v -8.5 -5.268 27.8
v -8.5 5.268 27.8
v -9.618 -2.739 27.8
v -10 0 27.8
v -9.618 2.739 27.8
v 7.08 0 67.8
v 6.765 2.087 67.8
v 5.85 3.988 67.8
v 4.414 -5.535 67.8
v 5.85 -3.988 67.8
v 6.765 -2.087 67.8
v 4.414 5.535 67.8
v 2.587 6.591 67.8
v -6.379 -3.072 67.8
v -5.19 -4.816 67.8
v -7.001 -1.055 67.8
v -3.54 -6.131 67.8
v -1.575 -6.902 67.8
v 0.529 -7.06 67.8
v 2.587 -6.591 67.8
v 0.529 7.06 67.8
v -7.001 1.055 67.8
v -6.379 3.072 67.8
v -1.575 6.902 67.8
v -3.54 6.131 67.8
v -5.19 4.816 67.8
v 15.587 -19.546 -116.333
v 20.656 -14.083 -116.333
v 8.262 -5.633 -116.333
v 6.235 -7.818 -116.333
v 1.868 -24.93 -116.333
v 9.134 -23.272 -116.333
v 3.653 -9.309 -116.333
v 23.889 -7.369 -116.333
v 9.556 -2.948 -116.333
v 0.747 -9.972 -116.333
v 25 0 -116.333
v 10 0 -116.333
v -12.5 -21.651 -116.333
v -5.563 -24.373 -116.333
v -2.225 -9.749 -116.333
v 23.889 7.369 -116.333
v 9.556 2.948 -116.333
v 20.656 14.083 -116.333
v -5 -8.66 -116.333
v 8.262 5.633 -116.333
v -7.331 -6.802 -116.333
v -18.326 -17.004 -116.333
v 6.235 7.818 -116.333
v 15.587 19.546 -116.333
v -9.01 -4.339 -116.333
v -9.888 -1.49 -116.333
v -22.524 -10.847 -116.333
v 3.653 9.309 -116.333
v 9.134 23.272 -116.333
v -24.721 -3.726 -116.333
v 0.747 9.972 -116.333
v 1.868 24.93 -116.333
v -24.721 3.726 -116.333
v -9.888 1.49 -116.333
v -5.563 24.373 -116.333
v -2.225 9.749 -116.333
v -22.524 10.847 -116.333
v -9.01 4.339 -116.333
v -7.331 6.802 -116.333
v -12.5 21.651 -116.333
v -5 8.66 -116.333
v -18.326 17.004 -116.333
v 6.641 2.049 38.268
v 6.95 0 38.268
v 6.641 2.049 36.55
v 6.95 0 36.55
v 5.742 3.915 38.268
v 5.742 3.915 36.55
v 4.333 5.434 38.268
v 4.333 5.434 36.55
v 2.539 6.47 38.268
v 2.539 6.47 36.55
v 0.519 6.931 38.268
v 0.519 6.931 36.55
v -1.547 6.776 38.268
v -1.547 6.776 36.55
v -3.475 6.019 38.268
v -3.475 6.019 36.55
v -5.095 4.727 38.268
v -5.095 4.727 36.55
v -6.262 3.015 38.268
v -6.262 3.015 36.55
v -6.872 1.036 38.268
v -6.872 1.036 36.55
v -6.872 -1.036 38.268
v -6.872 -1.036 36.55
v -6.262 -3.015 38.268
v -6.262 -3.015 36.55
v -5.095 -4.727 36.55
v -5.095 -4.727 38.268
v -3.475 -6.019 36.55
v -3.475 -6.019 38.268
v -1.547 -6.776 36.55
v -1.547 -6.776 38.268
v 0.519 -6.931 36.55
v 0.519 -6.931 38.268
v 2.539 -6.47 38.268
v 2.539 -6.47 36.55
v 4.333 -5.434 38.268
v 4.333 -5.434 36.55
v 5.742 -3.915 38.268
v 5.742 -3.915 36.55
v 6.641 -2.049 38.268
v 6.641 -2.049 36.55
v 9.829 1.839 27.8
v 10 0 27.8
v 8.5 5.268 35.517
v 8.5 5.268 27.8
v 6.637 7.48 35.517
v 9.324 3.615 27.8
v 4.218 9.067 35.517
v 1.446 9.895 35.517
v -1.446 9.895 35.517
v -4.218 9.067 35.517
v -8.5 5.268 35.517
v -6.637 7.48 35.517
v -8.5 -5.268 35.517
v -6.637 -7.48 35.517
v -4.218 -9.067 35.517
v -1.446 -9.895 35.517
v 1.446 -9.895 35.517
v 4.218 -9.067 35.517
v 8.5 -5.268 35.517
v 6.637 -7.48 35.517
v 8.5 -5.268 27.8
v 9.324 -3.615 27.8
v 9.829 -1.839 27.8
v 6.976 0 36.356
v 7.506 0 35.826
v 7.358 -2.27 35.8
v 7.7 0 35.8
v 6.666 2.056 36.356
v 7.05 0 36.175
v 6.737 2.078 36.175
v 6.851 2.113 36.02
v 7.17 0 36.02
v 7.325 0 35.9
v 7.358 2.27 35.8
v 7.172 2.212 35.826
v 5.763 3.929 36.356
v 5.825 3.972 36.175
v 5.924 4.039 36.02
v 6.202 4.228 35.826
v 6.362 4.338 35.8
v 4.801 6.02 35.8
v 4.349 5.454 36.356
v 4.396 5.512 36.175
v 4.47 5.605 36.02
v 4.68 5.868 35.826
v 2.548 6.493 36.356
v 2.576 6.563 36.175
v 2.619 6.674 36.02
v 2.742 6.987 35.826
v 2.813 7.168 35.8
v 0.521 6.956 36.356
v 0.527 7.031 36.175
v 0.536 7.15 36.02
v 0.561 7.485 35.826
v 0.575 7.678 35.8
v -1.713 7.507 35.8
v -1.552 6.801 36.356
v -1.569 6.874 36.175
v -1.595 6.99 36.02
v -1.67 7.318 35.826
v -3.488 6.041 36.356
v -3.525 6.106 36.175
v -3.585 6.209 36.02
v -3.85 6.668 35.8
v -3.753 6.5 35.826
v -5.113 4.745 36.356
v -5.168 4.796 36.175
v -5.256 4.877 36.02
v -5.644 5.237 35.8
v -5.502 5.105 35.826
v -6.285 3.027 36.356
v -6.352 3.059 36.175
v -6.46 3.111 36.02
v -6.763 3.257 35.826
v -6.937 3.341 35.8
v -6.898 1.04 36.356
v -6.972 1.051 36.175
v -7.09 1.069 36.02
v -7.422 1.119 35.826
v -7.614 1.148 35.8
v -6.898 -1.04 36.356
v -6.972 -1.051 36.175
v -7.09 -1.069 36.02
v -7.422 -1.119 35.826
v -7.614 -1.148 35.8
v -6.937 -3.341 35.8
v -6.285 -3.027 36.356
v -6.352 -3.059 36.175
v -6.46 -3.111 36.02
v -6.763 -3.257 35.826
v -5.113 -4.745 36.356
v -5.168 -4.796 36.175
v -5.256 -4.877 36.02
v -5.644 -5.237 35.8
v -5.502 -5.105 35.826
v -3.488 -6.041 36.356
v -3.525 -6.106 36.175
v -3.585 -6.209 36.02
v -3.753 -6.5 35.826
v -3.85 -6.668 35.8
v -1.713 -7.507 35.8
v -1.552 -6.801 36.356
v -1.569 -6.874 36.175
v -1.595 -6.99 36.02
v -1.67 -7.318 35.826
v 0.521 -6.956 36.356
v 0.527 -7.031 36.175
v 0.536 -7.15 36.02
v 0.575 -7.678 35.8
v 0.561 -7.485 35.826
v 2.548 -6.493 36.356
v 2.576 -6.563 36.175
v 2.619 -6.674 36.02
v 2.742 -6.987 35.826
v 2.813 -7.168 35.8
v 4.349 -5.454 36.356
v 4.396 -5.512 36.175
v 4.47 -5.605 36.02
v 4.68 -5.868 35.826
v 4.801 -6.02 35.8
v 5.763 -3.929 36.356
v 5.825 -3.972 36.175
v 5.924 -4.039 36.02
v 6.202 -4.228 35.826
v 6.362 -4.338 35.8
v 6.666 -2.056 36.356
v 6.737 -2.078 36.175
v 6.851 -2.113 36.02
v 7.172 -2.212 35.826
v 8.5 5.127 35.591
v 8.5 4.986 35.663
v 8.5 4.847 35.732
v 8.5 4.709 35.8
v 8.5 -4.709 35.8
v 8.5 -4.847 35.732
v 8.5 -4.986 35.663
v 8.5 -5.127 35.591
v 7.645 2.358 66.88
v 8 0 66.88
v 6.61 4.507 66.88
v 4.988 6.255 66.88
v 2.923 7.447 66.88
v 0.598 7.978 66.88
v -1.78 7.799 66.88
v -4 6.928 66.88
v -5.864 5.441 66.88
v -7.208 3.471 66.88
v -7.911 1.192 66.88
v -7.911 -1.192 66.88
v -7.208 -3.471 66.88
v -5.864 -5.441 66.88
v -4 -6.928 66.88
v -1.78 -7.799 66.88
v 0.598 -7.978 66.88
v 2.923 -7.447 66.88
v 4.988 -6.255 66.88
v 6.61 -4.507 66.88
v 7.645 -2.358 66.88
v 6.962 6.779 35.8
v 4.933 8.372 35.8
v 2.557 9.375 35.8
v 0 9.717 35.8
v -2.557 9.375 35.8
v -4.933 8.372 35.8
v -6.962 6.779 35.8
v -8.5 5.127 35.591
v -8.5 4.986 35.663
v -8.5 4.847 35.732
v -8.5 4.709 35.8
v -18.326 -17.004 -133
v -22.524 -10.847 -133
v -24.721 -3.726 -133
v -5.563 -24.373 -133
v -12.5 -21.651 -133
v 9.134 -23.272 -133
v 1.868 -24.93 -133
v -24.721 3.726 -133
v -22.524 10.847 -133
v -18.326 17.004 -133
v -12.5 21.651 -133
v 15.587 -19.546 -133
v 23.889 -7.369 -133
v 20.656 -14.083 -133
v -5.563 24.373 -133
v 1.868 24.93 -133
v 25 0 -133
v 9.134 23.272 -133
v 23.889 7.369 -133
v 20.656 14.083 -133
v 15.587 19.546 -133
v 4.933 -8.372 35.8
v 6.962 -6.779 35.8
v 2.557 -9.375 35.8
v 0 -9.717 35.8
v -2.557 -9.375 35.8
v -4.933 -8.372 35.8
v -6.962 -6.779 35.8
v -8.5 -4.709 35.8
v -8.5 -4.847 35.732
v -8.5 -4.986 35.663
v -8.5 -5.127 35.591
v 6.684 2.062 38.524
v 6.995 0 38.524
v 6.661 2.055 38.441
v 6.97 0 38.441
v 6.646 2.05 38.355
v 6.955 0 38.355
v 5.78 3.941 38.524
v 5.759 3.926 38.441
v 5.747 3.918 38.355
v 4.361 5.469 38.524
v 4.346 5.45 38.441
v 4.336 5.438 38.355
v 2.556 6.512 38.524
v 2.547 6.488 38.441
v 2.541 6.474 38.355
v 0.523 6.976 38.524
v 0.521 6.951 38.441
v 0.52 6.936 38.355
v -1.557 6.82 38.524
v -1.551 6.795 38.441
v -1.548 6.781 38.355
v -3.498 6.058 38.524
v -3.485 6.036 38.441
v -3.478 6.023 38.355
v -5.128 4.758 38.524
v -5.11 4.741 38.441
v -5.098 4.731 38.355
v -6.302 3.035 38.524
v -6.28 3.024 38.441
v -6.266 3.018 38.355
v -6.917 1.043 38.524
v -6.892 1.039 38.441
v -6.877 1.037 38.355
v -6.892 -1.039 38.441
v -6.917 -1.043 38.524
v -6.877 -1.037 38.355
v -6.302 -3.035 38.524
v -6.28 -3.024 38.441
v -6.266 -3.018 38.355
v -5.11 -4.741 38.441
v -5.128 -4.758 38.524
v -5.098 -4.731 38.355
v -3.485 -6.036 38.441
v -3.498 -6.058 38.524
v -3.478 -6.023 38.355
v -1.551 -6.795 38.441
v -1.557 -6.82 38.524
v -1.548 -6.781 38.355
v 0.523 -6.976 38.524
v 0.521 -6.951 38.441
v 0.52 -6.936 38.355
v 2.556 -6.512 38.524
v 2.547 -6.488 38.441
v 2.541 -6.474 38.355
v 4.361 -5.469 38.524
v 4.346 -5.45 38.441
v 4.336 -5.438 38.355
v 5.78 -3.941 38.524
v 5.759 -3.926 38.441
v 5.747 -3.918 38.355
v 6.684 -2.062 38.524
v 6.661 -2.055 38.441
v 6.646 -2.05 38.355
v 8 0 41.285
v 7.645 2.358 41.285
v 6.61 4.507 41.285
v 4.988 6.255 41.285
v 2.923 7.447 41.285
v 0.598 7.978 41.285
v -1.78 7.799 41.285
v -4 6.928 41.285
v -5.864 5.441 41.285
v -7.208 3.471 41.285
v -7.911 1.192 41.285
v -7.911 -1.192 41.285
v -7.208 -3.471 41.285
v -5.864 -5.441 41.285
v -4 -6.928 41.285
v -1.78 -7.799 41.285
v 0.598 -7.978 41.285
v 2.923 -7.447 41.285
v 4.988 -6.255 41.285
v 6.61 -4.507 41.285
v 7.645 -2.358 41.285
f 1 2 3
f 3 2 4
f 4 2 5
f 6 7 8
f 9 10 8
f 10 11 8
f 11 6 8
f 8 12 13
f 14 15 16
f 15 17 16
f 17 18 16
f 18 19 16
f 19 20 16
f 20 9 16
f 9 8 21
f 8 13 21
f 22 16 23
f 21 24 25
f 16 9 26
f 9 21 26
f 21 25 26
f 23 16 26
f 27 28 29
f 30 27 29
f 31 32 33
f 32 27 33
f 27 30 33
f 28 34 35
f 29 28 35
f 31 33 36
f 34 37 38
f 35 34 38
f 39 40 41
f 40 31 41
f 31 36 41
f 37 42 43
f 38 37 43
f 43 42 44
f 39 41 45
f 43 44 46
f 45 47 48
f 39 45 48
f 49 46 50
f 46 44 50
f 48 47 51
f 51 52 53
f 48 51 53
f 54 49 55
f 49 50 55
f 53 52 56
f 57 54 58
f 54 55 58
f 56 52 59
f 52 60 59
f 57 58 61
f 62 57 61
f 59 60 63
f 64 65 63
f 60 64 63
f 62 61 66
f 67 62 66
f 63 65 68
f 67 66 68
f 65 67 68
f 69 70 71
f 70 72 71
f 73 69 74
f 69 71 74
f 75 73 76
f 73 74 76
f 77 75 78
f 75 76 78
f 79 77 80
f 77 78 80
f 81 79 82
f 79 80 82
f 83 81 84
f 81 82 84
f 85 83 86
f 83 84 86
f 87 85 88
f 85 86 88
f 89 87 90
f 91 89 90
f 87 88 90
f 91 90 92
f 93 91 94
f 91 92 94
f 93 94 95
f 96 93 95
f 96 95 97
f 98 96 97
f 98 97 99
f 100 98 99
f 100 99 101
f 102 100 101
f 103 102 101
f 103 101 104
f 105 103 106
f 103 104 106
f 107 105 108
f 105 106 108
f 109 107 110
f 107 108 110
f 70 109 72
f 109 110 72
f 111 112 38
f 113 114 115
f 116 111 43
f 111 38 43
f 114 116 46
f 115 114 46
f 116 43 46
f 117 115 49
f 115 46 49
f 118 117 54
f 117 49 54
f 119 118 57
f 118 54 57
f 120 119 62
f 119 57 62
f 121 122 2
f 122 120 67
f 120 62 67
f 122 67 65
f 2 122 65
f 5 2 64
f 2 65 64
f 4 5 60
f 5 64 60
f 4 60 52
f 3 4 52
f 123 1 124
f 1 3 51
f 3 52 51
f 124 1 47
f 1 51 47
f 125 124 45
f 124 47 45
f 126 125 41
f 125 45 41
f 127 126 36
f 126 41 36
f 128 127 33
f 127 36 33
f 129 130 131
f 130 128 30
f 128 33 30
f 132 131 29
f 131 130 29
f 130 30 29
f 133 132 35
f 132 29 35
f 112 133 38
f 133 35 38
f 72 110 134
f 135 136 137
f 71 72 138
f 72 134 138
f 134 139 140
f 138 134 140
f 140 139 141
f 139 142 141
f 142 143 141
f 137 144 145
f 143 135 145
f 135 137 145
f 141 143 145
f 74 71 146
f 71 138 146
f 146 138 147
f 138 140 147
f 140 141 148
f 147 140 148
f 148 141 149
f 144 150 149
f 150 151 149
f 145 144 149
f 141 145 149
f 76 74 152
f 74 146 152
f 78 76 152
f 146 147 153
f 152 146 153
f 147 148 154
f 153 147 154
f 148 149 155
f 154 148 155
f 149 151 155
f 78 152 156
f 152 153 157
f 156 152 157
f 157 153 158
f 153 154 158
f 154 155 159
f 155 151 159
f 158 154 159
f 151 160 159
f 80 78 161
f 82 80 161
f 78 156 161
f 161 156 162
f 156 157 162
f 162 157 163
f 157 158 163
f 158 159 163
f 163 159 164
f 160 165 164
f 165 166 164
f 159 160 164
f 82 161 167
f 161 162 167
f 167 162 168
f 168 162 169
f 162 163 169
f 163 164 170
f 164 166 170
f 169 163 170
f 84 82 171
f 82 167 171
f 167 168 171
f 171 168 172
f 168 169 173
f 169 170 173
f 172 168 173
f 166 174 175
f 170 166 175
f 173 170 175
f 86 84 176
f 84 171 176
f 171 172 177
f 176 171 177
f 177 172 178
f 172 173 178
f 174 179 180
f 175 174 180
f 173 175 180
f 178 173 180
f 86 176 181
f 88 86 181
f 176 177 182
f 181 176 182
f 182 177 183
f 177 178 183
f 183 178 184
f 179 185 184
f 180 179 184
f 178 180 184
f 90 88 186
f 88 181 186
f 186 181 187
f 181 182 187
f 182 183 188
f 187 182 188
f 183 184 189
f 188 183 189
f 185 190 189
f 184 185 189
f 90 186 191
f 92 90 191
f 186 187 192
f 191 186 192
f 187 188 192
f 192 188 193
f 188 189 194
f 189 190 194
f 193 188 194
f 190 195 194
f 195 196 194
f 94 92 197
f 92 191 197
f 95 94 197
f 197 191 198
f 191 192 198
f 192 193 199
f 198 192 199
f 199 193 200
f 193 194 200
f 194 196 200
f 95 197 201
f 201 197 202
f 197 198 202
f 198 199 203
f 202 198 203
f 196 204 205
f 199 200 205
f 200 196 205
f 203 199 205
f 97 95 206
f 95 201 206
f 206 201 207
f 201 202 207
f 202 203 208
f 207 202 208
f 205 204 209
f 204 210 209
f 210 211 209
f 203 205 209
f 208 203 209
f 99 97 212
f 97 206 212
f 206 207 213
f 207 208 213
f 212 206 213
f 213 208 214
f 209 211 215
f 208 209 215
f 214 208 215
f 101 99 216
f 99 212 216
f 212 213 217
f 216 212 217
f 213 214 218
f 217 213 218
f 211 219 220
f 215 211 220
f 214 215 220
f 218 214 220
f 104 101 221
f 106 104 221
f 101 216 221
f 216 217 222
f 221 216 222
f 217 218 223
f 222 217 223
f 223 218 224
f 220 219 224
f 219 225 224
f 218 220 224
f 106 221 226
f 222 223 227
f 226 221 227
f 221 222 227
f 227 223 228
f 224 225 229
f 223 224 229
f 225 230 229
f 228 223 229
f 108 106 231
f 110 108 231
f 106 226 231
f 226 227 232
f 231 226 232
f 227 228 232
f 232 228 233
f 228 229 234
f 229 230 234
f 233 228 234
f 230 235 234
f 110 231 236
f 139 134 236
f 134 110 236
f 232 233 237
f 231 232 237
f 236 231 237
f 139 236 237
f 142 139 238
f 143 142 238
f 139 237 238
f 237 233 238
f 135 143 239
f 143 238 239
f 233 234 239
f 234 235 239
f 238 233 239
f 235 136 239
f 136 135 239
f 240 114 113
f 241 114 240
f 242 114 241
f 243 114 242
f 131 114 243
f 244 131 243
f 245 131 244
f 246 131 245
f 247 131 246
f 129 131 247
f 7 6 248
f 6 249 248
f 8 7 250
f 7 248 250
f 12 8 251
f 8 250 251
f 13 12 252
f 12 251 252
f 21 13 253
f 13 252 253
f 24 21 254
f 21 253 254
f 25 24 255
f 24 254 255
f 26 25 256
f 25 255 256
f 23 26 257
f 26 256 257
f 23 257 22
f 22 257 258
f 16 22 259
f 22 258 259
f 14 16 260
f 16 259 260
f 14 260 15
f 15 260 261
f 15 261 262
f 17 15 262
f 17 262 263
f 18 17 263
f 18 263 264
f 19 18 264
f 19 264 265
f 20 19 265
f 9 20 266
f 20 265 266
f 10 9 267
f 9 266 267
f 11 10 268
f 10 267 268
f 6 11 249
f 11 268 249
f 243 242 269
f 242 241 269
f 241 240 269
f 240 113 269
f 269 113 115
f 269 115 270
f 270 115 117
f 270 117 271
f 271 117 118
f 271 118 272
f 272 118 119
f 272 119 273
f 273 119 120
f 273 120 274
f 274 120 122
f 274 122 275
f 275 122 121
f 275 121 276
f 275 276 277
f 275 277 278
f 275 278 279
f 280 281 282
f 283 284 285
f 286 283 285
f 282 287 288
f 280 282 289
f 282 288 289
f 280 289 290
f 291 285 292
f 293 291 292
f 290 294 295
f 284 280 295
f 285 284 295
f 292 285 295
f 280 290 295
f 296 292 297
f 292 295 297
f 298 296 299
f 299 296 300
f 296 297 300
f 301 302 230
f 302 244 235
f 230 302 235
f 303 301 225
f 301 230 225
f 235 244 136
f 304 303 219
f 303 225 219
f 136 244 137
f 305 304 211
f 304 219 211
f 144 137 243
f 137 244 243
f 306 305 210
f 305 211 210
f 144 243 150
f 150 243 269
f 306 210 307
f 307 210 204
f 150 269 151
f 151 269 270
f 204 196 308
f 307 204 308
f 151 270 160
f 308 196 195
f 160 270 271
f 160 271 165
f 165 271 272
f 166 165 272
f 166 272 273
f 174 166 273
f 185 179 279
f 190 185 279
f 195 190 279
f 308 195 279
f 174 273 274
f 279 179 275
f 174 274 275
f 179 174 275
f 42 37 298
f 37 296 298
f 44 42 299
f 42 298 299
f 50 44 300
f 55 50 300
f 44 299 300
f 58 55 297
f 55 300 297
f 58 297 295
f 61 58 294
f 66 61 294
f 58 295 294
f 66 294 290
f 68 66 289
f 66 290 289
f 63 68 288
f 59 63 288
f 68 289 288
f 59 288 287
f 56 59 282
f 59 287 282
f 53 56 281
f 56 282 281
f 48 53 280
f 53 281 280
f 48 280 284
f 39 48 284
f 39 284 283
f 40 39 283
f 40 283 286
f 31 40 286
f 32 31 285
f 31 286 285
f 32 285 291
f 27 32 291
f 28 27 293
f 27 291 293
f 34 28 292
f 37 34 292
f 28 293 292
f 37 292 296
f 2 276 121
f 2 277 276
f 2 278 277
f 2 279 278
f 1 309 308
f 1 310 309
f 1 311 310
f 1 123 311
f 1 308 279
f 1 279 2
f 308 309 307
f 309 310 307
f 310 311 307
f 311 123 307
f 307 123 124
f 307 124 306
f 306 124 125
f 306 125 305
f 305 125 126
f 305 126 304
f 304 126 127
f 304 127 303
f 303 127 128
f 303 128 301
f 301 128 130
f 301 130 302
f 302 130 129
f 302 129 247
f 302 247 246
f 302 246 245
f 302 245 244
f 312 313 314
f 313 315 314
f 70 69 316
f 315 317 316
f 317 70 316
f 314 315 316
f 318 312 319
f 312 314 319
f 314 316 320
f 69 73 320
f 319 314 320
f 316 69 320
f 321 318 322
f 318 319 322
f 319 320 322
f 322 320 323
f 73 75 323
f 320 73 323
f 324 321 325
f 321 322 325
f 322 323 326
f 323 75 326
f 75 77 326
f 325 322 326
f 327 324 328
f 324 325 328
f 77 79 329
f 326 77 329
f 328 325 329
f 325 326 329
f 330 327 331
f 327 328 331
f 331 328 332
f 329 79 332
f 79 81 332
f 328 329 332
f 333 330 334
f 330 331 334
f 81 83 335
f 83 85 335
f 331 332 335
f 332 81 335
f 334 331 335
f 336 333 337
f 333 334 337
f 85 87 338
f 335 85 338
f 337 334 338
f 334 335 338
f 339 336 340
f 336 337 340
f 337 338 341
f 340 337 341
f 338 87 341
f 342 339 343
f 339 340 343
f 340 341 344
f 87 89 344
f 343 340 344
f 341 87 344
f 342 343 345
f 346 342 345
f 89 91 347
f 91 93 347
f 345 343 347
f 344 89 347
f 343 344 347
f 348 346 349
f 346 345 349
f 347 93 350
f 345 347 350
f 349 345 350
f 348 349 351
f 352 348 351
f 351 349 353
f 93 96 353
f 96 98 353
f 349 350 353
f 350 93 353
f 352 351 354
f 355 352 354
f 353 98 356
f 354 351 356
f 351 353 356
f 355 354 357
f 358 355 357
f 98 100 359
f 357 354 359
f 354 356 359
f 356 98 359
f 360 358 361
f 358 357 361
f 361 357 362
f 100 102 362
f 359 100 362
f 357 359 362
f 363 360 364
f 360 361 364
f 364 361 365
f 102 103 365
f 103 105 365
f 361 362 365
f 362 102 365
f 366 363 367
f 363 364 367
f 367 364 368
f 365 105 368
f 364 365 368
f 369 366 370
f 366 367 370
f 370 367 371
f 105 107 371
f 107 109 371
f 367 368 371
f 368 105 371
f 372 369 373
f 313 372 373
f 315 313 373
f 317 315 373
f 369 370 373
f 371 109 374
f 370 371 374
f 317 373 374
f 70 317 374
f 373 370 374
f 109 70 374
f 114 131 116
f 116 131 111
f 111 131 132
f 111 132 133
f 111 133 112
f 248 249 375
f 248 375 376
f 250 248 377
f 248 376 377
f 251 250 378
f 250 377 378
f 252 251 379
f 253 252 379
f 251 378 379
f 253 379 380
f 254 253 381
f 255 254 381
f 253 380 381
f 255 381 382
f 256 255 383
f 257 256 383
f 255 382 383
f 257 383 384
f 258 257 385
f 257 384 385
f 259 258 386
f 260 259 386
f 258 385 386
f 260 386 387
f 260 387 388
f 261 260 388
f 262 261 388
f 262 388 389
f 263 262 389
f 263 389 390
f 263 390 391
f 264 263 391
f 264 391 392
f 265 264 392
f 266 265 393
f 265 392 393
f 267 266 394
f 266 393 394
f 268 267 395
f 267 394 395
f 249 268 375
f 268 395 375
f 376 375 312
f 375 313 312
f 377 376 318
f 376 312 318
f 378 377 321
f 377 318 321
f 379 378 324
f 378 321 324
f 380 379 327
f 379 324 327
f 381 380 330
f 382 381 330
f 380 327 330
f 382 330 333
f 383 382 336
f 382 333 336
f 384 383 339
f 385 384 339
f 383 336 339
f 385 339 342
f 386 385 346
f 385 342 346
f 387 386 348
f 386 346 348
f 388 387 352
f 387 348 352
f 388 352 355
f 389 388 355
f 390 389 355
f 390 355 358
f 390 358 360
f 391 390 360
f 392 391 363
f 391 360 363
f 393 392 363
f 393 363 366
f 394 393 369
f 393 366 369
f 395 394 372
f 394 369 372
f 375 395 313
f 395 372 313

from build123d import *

# Parameters (mm, degrees)
CUT_EXTRUDE1_DEPTH      = 17
CUT_EXTRUDE1_DEPTH_BACK = 17


with BuildPart() as part:
    # Sketch1 → Revolve1 (revolve)
    with BuildSketch(Plane(origin=(0, 0, 0), x_dir=(0, 0, -1), z_dir=(1, 0, 0))):
        Polygon((-35.8, 0), (-35.8, 9.717157288), (-35.517157288, 10), (116.333333333, 10), (116.333333333, 25), (133, 25), (133, 0), align=None)
    revolve(axis=Axis((0, 0, -133), (0, 0, 1)))

    # Sketch2 → Cut-Extrude1 (cut, two sides: drawn at the far end of the back side and taken through both)
    with BuildSketch(Plane(origin=(0, 0, 0), x_dir=(1, 0, 0), z_dir=(0, 1, 0)).offset(-CUT_EXTRUDE1_DEPTH_BACK)):
        Polygon((-17, -61.8), (17, -61.8), (17, -27.8), (8.5, -27.8), (8.5, -43.8), (-8.5, -43.8), (-8.5, -27.8), (-17, -27.8), align=None)
    extrude(amount=CUT_EXTRUDE1_DEPTH + CUT_EXTRUDE1_DEPTH_BACK, mode=Mode.SUBTRACT)

    # Sketch3 → Revolve2 (revolve)
    with BuildSketch(Plane(origin=(0, 0, 0), x_dir=(0, 0, -1), z_dir=(1, 0, 0))):
        with BuildLine():
            Line((-67.8, 0), (-67.8, 7.08))
            Line((-67.8, 7.08), (-66.88, 8))
            Line((-66.88, 8), (-41.28485129, 8))
            Line((-41.28485129, 8), (-38.524269872, 6.995230534))
            ThreePointArc((-38.524269872, 6.995230534), (-38.397990898, 6.961394185), (-38.267754764, 6.95))
            Line((-38.267754764, 6.95), (-36.55, 6.95))
            ThreePointArc((-36.55, 6.95), (-36.019669914, 7.169669914), (-35.8, 7.7))
            Line((-35.8, 7.7), (-35.05, 7.7))
            Line((-35.05, 7.7), (-35.05, 0))
            Line((-35.05, 0), (-67.8, 0))
        make_face()
    revolve(axis=Axis((0, 0, 35.05), (0, 0, 1)))


solid = part.part
